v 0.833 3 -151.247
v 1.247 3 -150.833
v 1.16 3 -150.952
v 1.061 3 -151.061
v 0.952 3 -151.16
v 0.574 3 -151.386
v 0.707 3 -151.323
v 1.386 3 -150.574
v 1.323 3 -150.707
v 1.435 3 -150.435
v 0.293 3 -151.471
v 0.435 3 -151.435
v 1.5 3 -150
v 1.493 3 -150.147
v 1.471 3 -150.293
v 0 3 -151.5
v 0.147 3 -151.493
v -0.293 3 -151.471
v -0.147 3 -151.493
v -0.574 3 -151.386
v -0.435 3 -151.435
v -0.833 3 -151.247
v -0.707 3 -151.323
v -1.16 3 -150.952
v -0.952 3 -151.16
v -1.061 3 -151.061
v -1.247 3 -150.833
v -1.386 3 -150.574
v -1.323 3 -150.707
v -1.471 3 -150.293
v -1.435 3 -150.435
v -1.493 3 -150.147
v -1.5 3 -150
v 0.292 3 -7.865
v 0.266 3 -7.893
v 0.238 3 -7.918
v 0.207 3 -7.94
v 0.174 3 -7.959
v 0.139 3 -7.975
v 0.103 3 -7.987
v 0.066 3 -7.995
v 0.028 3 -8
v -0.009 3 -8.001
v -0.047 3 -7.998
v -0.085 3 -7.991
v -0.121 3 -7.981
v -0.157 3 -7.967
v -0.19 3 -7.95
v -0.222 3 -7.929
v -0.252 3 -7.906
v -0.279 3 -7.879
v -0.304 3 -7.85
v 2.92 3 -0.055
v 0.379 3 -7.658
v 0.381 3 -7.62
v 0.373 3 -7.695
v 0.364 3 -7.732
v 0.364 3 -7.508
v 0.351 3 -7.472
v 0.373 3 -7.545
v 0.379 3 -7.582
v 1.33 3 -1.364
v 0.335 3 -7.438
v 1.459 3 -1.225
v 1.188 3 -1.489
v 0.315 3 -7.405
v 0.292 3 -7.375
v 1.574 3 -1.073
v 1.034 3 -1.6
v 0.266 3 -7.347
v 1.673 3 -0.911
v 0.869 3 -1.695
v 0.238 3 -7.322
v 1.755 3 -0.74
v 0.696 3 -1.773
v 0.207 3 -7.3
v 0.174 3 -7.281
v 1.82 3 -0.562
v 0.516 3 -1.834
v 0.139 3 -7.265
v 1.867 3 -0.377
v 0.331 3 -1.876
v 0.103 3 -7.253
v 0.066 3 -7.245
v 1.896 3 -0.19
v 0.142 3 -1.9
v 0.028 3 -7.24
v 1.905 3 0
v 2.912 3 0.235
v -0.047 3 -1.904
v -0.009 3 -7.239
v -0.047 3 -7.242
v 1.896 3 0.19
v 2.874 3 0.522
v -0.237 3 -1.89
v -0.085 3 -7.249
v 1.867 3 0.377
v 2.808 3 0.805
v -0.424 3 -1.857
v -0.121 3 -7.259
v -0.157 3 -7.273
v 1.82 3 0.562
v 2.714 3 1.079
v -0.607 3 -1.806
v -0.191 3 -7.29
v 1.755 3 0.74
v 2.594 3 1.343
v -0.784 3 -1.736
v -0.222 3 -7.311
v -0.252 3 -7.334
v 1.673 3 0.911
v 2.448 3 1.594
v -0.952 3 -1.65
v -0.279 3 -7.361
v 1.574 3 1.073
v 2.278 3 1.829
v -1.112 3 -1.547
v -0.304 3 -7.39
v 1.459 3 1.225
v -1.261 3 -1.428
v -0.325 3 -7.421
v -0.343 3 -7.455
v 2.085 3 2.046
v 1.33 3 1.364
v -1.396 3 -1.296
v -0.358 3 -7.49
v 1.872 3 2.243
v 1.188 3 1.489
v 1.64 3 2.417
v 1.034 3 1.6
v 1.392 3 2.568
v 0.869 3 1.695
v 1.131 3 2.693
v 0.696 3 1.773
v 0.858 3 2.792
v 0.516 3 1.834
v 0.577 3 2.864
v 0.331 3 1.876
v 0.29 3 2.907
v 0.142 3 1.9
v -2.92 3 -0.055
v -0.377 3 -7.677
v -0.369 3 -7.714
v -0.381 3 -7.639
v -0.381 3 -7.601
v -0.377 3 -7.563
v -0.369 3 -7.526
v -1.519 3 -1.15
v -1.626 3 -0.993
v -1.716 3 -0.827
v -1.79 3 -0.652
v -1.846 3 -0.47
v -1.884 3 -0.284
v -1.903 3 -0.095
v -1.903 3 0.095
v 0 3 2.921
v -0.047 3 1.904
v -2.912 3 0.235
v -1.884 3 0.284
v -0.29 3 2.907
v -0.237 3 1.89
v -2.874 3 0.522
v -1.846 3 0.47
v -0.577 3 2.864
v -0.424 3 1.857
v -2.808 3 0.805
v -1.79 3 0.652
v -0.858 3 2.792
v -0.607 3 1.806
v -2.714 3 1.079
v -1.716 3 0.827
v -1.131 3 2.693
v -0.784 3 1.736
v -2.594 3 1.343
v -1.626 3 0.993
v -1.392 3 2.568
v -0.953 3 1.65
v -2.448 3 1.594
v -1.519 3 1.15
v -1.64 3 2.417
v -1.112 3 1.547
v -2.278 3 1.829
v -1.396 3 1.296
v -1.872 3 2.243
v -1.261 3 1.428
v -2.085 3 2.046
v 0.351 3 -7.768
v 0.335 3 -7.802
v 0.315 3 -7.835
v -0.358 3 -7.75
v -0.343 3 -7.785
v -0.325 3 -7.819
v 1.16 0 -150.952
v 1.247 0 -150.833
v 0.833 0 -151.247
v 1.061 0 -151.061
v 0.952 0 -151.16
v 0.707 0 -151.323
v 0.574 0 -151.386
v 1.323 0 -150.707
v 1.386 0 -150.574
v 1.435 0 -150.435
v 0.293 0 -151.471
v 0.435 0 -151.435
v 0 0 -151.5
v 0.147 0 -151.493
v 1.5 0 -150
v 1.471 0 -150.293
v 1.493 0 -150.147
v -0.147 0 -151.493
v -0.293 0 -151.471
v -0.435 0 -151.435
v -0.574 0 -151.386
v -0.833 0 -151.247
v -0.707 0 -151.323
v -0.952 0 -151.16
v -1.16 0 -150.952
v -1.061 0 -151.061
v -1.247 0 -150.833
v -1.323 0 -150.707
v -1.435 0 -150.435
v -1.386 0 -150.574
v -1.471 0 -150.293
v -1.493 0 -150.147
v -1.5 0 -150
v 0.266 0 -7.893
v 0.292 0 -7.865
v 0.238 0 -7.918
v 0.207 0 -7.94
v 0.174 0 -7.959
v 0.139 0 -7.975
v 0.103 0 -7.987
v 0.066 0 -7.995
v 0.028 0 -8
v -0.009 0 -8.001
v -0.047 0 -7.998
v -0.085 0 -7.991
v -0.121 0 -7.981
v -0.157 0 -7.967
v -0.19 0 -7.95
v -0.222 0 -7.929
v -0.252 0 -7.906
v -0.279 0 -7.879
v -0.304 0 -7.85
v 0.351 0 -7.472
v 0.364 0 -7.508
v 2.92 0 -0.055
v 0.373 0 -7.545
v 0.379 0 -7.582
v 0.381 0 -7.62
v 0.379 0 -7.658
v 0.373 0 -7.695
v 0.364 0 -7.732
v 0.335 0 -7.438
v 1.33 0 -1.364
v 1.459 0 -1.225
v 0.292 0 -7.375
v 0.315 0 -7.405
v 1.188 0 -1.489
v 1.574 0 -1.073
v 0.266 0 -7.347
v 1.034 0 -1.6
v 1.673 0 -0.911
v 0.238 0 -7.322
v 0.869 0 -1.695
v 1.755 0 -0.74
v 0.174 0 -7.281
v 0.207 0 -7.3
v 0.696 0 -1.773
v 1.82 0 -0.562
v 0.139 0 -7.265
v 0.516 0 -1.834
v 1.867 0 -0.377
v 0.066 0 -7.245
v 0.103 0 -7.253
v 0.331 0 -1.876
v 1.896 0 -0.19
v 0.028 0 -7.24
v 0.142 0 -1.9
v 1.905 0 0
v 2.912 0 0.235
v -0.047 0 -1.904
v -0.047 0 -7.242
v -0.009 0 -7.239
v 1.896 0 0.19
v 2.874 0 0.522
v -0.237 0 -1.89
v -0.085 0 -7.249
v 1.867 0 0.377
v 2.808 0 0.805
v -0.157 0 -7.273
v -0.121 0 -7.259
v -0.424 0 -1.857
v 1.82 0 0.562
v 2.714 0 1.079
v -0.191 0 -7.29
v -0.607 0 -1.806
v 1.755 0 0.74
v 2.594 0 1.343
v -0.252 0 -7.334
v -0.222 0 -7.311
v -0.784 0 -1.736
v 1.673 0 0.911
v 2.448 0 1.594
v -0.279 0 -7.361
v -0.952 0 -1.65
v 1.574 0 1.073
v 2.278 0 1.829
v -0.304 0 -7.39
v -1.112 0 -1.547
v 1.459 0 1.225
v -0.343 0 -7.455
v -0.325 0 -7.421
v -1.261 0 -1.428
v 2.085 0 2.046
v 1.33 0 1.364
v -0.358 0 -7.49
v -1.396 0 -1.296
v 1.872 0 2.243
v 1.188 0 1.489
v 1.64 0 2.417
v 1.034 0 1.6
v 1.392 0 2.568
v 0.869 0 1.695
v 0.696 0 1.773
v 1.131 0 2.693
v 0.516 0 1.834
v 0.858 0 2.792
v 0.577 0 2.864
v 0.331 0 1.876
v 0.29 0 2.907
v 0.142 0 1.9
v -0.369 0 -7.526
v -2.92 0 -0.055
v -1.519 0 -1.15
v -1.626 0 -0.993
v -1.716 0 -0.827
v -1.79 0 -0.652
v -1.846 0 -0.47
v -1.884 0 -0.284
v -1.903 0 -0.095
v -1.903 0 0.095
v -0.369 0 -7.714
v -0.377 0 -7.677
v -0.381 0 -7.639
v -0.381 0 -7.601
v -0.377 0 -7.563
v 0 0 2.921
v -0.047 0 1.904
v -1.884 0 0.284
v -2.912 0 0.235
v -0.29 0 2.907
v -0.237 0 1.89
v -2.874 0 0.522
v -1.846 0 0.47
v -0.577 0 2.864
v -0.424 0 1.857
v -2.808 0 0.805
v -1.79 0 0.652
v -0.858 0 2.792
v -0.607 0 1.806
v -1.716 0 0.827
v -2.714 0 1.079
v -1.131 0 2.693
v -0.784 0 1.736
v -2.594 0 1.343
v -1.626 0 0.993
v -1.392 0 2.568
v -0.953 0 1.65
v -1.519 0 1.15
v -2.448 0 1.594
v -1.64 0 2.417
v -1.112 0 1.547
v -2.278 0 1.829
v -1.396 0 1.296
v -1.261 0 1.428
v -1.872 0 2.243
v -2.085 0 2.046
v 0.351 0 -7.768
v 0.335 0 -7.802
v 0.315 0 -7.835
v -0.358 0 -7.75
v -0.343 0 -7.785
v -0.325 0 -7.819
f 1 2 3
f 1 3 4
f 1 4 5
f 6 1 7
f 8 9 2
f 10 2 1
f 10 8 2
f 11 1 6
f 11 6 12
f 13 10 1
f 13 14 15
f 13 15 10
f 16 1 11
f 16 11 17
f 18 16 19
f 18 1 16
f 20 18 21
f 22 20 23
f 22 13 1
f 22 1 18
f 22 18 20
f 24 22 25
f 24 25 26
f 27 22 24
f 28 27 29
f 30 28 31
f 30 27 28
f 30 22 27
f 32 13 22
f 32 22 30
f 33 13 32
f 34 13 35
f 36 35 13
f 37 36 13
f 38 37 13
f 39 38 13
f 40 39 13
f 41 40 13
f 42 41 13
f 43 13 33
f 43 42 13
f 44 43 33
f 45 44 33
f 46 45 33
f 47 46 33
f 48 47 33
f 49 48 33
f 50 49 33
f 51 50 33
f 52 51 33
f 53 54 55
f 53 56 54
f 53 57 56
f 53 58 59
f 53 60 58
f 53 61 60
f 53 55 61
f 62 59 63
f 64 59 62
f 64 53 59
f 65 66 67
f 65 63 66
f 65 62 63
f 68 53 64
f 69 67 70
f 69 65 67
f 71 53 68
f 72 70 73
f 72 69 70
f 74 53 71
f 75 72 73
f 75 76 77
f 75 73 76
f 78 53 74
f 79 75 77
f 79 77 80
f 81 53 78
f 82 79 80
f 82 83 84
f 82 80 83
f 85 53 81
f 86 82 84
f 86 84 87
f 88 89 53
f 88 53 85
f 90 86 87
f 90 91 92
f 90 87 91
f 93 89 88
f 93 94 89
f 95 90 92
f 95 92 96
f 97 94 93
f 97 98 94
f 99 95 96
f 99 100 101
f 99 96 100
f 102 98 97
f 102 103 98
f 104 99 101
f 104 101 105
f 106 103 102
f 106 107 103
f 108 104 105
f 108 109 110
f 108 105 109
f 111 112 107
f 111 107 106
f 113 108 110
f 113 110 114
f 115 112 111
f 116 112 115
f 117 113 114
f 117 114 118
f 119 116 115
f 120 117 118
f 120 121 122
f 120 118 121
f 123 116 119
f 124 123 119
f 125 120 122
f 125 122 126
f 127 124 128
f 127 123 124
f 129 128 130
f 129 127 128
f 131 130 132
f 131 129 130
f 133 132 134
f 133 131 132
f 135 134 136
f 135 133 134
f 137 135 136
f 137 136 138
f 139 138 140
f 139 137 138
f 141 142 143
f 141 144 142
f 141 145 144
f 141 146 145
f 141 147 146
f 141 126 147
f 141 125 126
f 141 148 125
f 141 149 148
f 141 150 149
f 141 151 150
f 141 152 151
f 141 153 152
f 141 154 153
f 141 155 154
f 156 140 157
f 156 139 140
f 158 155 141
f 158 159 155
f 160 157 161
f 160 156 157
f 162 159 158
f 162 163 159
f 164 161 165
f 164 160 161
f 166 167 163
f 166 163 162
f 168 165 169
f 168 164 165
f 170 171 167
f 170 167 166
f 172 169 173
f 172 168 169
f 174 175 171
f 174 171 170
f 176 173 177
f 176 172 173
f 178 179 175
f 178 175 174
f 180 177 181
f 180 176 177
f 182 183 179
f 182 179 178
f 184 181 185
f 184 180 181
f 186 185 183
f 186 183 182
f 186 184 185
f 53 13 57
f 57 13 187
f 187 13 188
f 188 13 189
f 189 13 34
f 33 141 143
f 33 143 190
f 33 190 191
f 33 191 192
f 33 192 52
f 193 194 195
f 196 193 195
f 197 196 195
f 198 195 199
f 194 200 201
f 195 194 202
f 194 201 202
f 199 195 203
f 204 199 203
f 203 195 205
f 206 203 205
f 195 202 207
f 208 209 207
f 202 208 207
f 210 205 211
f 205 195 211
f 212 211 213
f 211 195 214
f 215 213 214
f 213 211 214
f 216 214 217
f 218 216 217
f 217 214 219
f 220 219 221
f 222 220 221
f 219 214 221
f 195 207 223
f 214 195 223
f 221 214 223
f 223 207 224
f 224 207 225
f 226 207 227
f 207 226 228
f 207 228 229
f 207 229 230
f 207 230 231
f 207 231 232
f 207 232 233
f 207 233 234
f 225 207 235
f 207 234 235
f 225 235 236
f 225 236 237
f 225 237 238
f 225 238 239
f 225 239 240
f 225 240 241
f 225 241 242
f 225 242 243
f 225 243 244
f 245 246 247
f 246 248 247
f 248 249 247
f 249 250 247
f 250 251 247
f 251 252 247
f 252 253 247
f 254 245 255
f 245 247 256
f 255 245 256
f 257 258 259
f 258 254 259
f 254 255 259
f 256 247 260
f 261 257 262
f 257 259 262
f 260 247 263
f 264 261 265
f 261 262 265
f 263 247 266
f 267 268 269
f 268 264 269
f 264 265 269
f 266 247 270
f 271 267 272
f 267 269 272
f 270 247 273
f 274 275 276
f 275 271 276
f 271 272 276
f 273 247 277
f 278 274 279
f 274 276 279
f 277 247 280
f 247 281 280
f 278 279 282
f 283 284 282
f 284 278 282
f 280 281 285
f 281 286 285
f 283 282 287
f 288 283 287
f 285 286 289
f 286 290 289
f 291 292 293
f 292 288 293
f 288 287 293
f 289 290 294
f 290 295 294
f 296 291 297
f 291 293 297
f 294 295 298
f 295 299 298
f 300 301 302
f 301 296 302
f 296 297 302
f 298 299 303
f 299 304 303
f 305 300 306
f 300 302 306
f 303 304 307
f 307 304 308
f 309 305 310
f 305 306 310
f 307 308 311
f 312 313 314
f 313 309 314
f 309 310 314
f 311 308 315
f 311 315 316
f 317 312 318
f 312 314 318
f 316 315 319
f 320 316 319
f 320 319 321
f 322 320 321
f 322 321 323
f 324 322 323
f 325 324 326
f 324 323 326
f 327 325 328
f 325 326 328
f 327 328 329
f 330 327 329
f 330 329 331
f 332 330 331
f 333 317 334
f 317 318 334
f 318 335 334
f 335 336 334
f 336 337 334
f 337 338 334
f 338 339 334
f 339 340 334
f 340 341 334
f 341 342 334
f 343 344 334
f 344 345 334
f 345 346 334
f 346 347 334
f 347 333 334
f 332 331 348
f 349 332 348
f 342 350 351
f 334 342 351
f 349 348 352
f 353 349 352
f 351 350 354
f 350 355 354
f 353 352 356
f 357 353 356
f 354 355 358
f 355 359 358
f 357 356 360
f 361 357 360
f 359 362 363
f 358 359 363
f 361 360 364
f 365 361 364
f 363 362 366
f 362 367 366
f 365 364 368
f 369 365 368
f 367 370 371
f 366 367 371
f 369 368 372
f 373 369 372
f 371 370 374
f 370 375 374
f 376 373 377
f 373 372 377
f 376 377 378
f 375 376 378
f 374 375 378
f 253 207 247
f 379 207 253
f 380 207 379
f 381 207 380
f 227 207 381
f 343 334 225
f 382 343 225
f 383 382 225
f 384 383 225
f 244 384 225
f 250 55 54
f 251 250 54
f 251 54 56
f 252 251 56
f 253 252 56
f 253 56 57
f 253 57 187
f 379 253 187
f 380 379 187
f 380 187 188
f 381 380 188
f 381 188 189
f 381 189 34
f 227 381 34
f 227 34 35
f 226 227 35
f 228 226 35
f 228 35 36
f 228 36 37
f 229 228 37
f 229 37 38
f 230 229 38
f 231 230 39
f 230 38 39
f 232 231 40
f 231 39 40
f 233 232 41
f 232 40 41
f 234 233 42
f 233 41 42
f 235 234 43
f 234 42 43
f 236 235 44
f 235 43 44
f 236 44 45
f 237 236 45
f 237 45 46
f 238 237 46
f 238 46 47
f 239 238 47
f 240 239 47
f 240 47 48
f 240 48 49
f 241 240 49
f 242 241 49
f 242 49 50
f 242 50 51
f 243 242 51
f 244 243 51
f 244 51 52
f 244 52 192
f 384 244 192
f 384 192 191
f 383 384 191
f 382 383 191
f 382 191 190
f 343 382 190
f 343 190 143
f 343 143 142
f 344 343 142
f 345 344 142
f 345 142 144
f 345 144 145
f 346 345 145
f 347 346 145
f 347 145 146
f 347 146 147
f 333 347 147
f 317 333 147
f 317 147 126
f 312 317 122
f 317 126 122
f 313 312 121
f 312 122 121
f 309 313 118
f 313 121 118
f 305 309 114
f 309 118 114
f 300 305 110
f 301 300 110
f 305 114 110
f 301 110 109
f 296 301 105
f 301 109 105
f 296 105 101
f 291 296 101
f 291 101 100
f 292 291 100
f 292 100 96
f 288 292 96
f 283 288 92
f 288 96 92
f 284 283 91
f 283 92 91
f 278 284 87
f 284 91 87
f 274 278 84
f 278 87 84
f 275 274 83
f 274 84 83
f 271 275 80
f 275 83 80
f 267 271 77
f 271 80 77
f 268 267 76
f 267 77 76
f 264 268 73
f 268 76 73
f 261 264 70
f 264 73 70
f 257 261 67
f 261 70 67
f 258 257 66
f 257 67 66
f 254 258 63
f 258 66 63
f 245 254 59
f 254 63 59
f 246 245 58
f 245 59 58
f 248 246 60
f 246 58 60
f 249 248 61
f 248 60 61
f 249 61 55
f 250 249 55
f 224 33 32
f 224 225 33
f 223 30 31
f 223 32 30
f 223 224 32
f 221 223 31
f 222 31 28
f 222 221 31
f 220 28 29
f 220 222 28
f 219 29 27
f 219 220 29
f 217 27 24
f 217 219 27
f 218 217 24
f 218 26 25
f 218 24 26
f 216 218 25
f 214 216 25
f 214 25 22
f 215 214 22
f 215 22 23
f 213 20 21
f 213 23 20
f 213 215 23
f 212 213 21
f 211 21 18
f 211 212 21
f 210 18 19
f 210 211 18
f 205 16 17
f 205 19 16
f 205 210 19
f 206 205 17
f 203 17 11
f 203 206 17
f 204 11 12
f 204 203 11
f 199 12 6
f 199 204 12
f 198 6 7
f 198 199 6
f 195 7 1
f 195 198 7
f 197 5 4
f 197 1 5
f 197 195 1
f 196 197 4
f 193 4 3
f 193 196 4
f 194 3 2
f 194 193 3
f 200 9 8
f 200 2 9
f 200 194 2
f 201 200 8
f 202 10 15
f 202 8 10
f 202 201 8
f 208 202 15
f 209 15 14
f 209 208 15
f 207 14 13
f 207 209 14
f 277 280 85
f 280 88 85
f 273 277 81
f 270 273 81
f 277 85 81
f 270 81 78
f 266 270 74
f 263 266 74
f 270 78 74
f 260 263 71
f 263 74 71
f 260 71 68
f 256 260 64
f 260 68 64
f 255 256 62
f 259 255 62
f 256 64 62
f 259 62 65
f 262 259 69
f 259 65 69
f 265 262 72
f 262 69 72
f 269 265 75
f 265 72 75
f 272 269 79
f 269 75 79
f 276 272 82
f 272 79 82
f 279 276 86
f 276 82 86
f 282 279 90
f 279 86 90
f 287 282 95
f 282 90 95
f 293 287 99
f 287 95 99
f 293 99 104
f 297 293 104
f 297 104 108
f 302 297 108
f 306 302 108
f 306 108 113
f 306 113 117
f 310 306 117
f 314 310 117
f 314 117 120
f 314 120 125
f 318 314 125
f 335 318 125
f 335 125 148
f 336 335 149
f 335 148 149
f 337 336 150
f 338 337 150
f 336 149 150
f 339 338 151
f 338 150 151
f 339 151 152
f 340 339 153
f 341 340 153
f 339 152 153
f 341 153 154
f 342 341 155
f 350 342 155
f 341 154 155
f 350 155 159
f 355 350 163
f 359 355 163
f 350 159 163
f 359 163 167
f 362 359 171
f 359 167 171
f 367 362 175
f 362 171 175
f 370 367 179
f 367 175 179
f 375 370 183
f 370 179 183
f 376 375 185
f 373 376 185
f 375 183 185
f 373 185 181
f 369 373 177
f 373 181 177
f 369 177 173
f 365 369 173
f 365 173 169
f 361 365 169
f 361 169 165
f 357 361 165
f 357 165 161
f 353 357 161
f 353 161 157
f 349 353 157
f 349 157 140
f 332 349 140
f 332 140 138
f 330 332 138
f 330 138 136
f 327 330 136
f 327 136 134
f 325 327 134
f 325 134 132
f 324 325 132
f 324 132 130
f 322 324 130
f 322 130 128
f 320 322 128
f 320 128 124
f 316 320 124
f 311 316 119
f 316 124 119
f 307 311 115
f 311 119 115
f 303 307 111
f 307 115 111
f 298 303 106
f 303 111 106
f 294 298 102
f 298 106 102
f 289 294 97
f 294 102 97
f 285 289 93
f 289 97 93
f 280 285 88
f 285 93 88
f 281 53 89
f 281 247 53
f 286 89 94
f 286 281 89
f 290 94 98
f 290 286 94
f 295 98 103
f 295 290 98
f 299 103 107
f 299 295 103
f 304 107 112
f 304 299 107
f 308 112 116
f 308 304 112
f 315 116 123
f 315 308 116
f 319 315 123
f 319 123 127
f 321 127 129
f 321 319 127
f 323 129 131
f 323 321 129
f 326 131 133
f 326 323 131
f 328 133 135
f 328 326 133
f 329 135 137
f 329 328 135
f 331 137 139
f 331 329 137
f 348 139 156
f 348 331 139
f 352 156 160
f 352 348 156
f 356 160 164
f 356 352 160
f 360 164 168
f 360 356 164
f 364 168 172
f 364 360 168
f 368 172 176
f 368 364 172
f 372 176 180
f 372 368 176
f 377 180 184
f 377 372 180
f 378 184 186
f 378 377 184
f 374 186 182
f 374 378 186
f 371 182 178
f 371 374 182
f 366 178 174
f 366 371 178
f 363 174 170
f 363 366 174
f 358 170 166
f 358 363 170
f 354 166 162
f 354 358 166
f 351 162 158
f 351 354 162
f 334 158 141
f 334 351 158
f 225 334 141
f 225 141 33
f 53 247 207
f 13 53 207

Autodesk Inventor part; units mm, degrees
ref_plane "YZ Plane" through (0, 0, 0) normal (1, 0, 0) x (0, 1, 0)
ref_plane "XZ Plane" through (0, 0, 0) normal (0, 1, 0) x (-1, 0, 0)
ref_plane "XY Plane" through (0, 0, 0) normal (0, 0, 1) x (1, 0, 0)
sketch "Sketch1" plane through (0, 0, 0) normal (0, 1, 0) x (-1, 0, 0)
  arc A0 (2.9205, -0.0553) -> (-2.9205, -0.0553) centre (0, 0) ccw
  arc A1 (-1.5, -150) -> (1.5, -150) centre (0, -150) ccw
  line L0 (2.921, 0) -> (1.5, -150)
  line L1 (-2.921, 0) -> (-1.5, -150)
  dimension "d1" = 5.842
  dimension "d3" = 3
extrude "Extrusion1" add sketch "Sketch1" along normal blind 3
sketch "Sketch2" plane through (0, 3, 0) normal (0, 1, 0) x (1, 0, 0)
  circle A0 centre (0, 0) radius 1.905
  dimension "d6" = 3.81
extrude "Extrusion2" cut sketch "Sketch2" against normal blind 3
sketch "Sketch3" plane through (0, 3, 0) normal (0, 1, 0) x (1, 0, 0)
  circle A0 centre (0, 7.62) radius 0.381
  point P0 (0, 0)
  dimension "d10" = 0.762
extrude "Extrusion3" cut sketch "Sketch3" against normal blind 3
properties part number "arm" material "Wood (Cherry)"
